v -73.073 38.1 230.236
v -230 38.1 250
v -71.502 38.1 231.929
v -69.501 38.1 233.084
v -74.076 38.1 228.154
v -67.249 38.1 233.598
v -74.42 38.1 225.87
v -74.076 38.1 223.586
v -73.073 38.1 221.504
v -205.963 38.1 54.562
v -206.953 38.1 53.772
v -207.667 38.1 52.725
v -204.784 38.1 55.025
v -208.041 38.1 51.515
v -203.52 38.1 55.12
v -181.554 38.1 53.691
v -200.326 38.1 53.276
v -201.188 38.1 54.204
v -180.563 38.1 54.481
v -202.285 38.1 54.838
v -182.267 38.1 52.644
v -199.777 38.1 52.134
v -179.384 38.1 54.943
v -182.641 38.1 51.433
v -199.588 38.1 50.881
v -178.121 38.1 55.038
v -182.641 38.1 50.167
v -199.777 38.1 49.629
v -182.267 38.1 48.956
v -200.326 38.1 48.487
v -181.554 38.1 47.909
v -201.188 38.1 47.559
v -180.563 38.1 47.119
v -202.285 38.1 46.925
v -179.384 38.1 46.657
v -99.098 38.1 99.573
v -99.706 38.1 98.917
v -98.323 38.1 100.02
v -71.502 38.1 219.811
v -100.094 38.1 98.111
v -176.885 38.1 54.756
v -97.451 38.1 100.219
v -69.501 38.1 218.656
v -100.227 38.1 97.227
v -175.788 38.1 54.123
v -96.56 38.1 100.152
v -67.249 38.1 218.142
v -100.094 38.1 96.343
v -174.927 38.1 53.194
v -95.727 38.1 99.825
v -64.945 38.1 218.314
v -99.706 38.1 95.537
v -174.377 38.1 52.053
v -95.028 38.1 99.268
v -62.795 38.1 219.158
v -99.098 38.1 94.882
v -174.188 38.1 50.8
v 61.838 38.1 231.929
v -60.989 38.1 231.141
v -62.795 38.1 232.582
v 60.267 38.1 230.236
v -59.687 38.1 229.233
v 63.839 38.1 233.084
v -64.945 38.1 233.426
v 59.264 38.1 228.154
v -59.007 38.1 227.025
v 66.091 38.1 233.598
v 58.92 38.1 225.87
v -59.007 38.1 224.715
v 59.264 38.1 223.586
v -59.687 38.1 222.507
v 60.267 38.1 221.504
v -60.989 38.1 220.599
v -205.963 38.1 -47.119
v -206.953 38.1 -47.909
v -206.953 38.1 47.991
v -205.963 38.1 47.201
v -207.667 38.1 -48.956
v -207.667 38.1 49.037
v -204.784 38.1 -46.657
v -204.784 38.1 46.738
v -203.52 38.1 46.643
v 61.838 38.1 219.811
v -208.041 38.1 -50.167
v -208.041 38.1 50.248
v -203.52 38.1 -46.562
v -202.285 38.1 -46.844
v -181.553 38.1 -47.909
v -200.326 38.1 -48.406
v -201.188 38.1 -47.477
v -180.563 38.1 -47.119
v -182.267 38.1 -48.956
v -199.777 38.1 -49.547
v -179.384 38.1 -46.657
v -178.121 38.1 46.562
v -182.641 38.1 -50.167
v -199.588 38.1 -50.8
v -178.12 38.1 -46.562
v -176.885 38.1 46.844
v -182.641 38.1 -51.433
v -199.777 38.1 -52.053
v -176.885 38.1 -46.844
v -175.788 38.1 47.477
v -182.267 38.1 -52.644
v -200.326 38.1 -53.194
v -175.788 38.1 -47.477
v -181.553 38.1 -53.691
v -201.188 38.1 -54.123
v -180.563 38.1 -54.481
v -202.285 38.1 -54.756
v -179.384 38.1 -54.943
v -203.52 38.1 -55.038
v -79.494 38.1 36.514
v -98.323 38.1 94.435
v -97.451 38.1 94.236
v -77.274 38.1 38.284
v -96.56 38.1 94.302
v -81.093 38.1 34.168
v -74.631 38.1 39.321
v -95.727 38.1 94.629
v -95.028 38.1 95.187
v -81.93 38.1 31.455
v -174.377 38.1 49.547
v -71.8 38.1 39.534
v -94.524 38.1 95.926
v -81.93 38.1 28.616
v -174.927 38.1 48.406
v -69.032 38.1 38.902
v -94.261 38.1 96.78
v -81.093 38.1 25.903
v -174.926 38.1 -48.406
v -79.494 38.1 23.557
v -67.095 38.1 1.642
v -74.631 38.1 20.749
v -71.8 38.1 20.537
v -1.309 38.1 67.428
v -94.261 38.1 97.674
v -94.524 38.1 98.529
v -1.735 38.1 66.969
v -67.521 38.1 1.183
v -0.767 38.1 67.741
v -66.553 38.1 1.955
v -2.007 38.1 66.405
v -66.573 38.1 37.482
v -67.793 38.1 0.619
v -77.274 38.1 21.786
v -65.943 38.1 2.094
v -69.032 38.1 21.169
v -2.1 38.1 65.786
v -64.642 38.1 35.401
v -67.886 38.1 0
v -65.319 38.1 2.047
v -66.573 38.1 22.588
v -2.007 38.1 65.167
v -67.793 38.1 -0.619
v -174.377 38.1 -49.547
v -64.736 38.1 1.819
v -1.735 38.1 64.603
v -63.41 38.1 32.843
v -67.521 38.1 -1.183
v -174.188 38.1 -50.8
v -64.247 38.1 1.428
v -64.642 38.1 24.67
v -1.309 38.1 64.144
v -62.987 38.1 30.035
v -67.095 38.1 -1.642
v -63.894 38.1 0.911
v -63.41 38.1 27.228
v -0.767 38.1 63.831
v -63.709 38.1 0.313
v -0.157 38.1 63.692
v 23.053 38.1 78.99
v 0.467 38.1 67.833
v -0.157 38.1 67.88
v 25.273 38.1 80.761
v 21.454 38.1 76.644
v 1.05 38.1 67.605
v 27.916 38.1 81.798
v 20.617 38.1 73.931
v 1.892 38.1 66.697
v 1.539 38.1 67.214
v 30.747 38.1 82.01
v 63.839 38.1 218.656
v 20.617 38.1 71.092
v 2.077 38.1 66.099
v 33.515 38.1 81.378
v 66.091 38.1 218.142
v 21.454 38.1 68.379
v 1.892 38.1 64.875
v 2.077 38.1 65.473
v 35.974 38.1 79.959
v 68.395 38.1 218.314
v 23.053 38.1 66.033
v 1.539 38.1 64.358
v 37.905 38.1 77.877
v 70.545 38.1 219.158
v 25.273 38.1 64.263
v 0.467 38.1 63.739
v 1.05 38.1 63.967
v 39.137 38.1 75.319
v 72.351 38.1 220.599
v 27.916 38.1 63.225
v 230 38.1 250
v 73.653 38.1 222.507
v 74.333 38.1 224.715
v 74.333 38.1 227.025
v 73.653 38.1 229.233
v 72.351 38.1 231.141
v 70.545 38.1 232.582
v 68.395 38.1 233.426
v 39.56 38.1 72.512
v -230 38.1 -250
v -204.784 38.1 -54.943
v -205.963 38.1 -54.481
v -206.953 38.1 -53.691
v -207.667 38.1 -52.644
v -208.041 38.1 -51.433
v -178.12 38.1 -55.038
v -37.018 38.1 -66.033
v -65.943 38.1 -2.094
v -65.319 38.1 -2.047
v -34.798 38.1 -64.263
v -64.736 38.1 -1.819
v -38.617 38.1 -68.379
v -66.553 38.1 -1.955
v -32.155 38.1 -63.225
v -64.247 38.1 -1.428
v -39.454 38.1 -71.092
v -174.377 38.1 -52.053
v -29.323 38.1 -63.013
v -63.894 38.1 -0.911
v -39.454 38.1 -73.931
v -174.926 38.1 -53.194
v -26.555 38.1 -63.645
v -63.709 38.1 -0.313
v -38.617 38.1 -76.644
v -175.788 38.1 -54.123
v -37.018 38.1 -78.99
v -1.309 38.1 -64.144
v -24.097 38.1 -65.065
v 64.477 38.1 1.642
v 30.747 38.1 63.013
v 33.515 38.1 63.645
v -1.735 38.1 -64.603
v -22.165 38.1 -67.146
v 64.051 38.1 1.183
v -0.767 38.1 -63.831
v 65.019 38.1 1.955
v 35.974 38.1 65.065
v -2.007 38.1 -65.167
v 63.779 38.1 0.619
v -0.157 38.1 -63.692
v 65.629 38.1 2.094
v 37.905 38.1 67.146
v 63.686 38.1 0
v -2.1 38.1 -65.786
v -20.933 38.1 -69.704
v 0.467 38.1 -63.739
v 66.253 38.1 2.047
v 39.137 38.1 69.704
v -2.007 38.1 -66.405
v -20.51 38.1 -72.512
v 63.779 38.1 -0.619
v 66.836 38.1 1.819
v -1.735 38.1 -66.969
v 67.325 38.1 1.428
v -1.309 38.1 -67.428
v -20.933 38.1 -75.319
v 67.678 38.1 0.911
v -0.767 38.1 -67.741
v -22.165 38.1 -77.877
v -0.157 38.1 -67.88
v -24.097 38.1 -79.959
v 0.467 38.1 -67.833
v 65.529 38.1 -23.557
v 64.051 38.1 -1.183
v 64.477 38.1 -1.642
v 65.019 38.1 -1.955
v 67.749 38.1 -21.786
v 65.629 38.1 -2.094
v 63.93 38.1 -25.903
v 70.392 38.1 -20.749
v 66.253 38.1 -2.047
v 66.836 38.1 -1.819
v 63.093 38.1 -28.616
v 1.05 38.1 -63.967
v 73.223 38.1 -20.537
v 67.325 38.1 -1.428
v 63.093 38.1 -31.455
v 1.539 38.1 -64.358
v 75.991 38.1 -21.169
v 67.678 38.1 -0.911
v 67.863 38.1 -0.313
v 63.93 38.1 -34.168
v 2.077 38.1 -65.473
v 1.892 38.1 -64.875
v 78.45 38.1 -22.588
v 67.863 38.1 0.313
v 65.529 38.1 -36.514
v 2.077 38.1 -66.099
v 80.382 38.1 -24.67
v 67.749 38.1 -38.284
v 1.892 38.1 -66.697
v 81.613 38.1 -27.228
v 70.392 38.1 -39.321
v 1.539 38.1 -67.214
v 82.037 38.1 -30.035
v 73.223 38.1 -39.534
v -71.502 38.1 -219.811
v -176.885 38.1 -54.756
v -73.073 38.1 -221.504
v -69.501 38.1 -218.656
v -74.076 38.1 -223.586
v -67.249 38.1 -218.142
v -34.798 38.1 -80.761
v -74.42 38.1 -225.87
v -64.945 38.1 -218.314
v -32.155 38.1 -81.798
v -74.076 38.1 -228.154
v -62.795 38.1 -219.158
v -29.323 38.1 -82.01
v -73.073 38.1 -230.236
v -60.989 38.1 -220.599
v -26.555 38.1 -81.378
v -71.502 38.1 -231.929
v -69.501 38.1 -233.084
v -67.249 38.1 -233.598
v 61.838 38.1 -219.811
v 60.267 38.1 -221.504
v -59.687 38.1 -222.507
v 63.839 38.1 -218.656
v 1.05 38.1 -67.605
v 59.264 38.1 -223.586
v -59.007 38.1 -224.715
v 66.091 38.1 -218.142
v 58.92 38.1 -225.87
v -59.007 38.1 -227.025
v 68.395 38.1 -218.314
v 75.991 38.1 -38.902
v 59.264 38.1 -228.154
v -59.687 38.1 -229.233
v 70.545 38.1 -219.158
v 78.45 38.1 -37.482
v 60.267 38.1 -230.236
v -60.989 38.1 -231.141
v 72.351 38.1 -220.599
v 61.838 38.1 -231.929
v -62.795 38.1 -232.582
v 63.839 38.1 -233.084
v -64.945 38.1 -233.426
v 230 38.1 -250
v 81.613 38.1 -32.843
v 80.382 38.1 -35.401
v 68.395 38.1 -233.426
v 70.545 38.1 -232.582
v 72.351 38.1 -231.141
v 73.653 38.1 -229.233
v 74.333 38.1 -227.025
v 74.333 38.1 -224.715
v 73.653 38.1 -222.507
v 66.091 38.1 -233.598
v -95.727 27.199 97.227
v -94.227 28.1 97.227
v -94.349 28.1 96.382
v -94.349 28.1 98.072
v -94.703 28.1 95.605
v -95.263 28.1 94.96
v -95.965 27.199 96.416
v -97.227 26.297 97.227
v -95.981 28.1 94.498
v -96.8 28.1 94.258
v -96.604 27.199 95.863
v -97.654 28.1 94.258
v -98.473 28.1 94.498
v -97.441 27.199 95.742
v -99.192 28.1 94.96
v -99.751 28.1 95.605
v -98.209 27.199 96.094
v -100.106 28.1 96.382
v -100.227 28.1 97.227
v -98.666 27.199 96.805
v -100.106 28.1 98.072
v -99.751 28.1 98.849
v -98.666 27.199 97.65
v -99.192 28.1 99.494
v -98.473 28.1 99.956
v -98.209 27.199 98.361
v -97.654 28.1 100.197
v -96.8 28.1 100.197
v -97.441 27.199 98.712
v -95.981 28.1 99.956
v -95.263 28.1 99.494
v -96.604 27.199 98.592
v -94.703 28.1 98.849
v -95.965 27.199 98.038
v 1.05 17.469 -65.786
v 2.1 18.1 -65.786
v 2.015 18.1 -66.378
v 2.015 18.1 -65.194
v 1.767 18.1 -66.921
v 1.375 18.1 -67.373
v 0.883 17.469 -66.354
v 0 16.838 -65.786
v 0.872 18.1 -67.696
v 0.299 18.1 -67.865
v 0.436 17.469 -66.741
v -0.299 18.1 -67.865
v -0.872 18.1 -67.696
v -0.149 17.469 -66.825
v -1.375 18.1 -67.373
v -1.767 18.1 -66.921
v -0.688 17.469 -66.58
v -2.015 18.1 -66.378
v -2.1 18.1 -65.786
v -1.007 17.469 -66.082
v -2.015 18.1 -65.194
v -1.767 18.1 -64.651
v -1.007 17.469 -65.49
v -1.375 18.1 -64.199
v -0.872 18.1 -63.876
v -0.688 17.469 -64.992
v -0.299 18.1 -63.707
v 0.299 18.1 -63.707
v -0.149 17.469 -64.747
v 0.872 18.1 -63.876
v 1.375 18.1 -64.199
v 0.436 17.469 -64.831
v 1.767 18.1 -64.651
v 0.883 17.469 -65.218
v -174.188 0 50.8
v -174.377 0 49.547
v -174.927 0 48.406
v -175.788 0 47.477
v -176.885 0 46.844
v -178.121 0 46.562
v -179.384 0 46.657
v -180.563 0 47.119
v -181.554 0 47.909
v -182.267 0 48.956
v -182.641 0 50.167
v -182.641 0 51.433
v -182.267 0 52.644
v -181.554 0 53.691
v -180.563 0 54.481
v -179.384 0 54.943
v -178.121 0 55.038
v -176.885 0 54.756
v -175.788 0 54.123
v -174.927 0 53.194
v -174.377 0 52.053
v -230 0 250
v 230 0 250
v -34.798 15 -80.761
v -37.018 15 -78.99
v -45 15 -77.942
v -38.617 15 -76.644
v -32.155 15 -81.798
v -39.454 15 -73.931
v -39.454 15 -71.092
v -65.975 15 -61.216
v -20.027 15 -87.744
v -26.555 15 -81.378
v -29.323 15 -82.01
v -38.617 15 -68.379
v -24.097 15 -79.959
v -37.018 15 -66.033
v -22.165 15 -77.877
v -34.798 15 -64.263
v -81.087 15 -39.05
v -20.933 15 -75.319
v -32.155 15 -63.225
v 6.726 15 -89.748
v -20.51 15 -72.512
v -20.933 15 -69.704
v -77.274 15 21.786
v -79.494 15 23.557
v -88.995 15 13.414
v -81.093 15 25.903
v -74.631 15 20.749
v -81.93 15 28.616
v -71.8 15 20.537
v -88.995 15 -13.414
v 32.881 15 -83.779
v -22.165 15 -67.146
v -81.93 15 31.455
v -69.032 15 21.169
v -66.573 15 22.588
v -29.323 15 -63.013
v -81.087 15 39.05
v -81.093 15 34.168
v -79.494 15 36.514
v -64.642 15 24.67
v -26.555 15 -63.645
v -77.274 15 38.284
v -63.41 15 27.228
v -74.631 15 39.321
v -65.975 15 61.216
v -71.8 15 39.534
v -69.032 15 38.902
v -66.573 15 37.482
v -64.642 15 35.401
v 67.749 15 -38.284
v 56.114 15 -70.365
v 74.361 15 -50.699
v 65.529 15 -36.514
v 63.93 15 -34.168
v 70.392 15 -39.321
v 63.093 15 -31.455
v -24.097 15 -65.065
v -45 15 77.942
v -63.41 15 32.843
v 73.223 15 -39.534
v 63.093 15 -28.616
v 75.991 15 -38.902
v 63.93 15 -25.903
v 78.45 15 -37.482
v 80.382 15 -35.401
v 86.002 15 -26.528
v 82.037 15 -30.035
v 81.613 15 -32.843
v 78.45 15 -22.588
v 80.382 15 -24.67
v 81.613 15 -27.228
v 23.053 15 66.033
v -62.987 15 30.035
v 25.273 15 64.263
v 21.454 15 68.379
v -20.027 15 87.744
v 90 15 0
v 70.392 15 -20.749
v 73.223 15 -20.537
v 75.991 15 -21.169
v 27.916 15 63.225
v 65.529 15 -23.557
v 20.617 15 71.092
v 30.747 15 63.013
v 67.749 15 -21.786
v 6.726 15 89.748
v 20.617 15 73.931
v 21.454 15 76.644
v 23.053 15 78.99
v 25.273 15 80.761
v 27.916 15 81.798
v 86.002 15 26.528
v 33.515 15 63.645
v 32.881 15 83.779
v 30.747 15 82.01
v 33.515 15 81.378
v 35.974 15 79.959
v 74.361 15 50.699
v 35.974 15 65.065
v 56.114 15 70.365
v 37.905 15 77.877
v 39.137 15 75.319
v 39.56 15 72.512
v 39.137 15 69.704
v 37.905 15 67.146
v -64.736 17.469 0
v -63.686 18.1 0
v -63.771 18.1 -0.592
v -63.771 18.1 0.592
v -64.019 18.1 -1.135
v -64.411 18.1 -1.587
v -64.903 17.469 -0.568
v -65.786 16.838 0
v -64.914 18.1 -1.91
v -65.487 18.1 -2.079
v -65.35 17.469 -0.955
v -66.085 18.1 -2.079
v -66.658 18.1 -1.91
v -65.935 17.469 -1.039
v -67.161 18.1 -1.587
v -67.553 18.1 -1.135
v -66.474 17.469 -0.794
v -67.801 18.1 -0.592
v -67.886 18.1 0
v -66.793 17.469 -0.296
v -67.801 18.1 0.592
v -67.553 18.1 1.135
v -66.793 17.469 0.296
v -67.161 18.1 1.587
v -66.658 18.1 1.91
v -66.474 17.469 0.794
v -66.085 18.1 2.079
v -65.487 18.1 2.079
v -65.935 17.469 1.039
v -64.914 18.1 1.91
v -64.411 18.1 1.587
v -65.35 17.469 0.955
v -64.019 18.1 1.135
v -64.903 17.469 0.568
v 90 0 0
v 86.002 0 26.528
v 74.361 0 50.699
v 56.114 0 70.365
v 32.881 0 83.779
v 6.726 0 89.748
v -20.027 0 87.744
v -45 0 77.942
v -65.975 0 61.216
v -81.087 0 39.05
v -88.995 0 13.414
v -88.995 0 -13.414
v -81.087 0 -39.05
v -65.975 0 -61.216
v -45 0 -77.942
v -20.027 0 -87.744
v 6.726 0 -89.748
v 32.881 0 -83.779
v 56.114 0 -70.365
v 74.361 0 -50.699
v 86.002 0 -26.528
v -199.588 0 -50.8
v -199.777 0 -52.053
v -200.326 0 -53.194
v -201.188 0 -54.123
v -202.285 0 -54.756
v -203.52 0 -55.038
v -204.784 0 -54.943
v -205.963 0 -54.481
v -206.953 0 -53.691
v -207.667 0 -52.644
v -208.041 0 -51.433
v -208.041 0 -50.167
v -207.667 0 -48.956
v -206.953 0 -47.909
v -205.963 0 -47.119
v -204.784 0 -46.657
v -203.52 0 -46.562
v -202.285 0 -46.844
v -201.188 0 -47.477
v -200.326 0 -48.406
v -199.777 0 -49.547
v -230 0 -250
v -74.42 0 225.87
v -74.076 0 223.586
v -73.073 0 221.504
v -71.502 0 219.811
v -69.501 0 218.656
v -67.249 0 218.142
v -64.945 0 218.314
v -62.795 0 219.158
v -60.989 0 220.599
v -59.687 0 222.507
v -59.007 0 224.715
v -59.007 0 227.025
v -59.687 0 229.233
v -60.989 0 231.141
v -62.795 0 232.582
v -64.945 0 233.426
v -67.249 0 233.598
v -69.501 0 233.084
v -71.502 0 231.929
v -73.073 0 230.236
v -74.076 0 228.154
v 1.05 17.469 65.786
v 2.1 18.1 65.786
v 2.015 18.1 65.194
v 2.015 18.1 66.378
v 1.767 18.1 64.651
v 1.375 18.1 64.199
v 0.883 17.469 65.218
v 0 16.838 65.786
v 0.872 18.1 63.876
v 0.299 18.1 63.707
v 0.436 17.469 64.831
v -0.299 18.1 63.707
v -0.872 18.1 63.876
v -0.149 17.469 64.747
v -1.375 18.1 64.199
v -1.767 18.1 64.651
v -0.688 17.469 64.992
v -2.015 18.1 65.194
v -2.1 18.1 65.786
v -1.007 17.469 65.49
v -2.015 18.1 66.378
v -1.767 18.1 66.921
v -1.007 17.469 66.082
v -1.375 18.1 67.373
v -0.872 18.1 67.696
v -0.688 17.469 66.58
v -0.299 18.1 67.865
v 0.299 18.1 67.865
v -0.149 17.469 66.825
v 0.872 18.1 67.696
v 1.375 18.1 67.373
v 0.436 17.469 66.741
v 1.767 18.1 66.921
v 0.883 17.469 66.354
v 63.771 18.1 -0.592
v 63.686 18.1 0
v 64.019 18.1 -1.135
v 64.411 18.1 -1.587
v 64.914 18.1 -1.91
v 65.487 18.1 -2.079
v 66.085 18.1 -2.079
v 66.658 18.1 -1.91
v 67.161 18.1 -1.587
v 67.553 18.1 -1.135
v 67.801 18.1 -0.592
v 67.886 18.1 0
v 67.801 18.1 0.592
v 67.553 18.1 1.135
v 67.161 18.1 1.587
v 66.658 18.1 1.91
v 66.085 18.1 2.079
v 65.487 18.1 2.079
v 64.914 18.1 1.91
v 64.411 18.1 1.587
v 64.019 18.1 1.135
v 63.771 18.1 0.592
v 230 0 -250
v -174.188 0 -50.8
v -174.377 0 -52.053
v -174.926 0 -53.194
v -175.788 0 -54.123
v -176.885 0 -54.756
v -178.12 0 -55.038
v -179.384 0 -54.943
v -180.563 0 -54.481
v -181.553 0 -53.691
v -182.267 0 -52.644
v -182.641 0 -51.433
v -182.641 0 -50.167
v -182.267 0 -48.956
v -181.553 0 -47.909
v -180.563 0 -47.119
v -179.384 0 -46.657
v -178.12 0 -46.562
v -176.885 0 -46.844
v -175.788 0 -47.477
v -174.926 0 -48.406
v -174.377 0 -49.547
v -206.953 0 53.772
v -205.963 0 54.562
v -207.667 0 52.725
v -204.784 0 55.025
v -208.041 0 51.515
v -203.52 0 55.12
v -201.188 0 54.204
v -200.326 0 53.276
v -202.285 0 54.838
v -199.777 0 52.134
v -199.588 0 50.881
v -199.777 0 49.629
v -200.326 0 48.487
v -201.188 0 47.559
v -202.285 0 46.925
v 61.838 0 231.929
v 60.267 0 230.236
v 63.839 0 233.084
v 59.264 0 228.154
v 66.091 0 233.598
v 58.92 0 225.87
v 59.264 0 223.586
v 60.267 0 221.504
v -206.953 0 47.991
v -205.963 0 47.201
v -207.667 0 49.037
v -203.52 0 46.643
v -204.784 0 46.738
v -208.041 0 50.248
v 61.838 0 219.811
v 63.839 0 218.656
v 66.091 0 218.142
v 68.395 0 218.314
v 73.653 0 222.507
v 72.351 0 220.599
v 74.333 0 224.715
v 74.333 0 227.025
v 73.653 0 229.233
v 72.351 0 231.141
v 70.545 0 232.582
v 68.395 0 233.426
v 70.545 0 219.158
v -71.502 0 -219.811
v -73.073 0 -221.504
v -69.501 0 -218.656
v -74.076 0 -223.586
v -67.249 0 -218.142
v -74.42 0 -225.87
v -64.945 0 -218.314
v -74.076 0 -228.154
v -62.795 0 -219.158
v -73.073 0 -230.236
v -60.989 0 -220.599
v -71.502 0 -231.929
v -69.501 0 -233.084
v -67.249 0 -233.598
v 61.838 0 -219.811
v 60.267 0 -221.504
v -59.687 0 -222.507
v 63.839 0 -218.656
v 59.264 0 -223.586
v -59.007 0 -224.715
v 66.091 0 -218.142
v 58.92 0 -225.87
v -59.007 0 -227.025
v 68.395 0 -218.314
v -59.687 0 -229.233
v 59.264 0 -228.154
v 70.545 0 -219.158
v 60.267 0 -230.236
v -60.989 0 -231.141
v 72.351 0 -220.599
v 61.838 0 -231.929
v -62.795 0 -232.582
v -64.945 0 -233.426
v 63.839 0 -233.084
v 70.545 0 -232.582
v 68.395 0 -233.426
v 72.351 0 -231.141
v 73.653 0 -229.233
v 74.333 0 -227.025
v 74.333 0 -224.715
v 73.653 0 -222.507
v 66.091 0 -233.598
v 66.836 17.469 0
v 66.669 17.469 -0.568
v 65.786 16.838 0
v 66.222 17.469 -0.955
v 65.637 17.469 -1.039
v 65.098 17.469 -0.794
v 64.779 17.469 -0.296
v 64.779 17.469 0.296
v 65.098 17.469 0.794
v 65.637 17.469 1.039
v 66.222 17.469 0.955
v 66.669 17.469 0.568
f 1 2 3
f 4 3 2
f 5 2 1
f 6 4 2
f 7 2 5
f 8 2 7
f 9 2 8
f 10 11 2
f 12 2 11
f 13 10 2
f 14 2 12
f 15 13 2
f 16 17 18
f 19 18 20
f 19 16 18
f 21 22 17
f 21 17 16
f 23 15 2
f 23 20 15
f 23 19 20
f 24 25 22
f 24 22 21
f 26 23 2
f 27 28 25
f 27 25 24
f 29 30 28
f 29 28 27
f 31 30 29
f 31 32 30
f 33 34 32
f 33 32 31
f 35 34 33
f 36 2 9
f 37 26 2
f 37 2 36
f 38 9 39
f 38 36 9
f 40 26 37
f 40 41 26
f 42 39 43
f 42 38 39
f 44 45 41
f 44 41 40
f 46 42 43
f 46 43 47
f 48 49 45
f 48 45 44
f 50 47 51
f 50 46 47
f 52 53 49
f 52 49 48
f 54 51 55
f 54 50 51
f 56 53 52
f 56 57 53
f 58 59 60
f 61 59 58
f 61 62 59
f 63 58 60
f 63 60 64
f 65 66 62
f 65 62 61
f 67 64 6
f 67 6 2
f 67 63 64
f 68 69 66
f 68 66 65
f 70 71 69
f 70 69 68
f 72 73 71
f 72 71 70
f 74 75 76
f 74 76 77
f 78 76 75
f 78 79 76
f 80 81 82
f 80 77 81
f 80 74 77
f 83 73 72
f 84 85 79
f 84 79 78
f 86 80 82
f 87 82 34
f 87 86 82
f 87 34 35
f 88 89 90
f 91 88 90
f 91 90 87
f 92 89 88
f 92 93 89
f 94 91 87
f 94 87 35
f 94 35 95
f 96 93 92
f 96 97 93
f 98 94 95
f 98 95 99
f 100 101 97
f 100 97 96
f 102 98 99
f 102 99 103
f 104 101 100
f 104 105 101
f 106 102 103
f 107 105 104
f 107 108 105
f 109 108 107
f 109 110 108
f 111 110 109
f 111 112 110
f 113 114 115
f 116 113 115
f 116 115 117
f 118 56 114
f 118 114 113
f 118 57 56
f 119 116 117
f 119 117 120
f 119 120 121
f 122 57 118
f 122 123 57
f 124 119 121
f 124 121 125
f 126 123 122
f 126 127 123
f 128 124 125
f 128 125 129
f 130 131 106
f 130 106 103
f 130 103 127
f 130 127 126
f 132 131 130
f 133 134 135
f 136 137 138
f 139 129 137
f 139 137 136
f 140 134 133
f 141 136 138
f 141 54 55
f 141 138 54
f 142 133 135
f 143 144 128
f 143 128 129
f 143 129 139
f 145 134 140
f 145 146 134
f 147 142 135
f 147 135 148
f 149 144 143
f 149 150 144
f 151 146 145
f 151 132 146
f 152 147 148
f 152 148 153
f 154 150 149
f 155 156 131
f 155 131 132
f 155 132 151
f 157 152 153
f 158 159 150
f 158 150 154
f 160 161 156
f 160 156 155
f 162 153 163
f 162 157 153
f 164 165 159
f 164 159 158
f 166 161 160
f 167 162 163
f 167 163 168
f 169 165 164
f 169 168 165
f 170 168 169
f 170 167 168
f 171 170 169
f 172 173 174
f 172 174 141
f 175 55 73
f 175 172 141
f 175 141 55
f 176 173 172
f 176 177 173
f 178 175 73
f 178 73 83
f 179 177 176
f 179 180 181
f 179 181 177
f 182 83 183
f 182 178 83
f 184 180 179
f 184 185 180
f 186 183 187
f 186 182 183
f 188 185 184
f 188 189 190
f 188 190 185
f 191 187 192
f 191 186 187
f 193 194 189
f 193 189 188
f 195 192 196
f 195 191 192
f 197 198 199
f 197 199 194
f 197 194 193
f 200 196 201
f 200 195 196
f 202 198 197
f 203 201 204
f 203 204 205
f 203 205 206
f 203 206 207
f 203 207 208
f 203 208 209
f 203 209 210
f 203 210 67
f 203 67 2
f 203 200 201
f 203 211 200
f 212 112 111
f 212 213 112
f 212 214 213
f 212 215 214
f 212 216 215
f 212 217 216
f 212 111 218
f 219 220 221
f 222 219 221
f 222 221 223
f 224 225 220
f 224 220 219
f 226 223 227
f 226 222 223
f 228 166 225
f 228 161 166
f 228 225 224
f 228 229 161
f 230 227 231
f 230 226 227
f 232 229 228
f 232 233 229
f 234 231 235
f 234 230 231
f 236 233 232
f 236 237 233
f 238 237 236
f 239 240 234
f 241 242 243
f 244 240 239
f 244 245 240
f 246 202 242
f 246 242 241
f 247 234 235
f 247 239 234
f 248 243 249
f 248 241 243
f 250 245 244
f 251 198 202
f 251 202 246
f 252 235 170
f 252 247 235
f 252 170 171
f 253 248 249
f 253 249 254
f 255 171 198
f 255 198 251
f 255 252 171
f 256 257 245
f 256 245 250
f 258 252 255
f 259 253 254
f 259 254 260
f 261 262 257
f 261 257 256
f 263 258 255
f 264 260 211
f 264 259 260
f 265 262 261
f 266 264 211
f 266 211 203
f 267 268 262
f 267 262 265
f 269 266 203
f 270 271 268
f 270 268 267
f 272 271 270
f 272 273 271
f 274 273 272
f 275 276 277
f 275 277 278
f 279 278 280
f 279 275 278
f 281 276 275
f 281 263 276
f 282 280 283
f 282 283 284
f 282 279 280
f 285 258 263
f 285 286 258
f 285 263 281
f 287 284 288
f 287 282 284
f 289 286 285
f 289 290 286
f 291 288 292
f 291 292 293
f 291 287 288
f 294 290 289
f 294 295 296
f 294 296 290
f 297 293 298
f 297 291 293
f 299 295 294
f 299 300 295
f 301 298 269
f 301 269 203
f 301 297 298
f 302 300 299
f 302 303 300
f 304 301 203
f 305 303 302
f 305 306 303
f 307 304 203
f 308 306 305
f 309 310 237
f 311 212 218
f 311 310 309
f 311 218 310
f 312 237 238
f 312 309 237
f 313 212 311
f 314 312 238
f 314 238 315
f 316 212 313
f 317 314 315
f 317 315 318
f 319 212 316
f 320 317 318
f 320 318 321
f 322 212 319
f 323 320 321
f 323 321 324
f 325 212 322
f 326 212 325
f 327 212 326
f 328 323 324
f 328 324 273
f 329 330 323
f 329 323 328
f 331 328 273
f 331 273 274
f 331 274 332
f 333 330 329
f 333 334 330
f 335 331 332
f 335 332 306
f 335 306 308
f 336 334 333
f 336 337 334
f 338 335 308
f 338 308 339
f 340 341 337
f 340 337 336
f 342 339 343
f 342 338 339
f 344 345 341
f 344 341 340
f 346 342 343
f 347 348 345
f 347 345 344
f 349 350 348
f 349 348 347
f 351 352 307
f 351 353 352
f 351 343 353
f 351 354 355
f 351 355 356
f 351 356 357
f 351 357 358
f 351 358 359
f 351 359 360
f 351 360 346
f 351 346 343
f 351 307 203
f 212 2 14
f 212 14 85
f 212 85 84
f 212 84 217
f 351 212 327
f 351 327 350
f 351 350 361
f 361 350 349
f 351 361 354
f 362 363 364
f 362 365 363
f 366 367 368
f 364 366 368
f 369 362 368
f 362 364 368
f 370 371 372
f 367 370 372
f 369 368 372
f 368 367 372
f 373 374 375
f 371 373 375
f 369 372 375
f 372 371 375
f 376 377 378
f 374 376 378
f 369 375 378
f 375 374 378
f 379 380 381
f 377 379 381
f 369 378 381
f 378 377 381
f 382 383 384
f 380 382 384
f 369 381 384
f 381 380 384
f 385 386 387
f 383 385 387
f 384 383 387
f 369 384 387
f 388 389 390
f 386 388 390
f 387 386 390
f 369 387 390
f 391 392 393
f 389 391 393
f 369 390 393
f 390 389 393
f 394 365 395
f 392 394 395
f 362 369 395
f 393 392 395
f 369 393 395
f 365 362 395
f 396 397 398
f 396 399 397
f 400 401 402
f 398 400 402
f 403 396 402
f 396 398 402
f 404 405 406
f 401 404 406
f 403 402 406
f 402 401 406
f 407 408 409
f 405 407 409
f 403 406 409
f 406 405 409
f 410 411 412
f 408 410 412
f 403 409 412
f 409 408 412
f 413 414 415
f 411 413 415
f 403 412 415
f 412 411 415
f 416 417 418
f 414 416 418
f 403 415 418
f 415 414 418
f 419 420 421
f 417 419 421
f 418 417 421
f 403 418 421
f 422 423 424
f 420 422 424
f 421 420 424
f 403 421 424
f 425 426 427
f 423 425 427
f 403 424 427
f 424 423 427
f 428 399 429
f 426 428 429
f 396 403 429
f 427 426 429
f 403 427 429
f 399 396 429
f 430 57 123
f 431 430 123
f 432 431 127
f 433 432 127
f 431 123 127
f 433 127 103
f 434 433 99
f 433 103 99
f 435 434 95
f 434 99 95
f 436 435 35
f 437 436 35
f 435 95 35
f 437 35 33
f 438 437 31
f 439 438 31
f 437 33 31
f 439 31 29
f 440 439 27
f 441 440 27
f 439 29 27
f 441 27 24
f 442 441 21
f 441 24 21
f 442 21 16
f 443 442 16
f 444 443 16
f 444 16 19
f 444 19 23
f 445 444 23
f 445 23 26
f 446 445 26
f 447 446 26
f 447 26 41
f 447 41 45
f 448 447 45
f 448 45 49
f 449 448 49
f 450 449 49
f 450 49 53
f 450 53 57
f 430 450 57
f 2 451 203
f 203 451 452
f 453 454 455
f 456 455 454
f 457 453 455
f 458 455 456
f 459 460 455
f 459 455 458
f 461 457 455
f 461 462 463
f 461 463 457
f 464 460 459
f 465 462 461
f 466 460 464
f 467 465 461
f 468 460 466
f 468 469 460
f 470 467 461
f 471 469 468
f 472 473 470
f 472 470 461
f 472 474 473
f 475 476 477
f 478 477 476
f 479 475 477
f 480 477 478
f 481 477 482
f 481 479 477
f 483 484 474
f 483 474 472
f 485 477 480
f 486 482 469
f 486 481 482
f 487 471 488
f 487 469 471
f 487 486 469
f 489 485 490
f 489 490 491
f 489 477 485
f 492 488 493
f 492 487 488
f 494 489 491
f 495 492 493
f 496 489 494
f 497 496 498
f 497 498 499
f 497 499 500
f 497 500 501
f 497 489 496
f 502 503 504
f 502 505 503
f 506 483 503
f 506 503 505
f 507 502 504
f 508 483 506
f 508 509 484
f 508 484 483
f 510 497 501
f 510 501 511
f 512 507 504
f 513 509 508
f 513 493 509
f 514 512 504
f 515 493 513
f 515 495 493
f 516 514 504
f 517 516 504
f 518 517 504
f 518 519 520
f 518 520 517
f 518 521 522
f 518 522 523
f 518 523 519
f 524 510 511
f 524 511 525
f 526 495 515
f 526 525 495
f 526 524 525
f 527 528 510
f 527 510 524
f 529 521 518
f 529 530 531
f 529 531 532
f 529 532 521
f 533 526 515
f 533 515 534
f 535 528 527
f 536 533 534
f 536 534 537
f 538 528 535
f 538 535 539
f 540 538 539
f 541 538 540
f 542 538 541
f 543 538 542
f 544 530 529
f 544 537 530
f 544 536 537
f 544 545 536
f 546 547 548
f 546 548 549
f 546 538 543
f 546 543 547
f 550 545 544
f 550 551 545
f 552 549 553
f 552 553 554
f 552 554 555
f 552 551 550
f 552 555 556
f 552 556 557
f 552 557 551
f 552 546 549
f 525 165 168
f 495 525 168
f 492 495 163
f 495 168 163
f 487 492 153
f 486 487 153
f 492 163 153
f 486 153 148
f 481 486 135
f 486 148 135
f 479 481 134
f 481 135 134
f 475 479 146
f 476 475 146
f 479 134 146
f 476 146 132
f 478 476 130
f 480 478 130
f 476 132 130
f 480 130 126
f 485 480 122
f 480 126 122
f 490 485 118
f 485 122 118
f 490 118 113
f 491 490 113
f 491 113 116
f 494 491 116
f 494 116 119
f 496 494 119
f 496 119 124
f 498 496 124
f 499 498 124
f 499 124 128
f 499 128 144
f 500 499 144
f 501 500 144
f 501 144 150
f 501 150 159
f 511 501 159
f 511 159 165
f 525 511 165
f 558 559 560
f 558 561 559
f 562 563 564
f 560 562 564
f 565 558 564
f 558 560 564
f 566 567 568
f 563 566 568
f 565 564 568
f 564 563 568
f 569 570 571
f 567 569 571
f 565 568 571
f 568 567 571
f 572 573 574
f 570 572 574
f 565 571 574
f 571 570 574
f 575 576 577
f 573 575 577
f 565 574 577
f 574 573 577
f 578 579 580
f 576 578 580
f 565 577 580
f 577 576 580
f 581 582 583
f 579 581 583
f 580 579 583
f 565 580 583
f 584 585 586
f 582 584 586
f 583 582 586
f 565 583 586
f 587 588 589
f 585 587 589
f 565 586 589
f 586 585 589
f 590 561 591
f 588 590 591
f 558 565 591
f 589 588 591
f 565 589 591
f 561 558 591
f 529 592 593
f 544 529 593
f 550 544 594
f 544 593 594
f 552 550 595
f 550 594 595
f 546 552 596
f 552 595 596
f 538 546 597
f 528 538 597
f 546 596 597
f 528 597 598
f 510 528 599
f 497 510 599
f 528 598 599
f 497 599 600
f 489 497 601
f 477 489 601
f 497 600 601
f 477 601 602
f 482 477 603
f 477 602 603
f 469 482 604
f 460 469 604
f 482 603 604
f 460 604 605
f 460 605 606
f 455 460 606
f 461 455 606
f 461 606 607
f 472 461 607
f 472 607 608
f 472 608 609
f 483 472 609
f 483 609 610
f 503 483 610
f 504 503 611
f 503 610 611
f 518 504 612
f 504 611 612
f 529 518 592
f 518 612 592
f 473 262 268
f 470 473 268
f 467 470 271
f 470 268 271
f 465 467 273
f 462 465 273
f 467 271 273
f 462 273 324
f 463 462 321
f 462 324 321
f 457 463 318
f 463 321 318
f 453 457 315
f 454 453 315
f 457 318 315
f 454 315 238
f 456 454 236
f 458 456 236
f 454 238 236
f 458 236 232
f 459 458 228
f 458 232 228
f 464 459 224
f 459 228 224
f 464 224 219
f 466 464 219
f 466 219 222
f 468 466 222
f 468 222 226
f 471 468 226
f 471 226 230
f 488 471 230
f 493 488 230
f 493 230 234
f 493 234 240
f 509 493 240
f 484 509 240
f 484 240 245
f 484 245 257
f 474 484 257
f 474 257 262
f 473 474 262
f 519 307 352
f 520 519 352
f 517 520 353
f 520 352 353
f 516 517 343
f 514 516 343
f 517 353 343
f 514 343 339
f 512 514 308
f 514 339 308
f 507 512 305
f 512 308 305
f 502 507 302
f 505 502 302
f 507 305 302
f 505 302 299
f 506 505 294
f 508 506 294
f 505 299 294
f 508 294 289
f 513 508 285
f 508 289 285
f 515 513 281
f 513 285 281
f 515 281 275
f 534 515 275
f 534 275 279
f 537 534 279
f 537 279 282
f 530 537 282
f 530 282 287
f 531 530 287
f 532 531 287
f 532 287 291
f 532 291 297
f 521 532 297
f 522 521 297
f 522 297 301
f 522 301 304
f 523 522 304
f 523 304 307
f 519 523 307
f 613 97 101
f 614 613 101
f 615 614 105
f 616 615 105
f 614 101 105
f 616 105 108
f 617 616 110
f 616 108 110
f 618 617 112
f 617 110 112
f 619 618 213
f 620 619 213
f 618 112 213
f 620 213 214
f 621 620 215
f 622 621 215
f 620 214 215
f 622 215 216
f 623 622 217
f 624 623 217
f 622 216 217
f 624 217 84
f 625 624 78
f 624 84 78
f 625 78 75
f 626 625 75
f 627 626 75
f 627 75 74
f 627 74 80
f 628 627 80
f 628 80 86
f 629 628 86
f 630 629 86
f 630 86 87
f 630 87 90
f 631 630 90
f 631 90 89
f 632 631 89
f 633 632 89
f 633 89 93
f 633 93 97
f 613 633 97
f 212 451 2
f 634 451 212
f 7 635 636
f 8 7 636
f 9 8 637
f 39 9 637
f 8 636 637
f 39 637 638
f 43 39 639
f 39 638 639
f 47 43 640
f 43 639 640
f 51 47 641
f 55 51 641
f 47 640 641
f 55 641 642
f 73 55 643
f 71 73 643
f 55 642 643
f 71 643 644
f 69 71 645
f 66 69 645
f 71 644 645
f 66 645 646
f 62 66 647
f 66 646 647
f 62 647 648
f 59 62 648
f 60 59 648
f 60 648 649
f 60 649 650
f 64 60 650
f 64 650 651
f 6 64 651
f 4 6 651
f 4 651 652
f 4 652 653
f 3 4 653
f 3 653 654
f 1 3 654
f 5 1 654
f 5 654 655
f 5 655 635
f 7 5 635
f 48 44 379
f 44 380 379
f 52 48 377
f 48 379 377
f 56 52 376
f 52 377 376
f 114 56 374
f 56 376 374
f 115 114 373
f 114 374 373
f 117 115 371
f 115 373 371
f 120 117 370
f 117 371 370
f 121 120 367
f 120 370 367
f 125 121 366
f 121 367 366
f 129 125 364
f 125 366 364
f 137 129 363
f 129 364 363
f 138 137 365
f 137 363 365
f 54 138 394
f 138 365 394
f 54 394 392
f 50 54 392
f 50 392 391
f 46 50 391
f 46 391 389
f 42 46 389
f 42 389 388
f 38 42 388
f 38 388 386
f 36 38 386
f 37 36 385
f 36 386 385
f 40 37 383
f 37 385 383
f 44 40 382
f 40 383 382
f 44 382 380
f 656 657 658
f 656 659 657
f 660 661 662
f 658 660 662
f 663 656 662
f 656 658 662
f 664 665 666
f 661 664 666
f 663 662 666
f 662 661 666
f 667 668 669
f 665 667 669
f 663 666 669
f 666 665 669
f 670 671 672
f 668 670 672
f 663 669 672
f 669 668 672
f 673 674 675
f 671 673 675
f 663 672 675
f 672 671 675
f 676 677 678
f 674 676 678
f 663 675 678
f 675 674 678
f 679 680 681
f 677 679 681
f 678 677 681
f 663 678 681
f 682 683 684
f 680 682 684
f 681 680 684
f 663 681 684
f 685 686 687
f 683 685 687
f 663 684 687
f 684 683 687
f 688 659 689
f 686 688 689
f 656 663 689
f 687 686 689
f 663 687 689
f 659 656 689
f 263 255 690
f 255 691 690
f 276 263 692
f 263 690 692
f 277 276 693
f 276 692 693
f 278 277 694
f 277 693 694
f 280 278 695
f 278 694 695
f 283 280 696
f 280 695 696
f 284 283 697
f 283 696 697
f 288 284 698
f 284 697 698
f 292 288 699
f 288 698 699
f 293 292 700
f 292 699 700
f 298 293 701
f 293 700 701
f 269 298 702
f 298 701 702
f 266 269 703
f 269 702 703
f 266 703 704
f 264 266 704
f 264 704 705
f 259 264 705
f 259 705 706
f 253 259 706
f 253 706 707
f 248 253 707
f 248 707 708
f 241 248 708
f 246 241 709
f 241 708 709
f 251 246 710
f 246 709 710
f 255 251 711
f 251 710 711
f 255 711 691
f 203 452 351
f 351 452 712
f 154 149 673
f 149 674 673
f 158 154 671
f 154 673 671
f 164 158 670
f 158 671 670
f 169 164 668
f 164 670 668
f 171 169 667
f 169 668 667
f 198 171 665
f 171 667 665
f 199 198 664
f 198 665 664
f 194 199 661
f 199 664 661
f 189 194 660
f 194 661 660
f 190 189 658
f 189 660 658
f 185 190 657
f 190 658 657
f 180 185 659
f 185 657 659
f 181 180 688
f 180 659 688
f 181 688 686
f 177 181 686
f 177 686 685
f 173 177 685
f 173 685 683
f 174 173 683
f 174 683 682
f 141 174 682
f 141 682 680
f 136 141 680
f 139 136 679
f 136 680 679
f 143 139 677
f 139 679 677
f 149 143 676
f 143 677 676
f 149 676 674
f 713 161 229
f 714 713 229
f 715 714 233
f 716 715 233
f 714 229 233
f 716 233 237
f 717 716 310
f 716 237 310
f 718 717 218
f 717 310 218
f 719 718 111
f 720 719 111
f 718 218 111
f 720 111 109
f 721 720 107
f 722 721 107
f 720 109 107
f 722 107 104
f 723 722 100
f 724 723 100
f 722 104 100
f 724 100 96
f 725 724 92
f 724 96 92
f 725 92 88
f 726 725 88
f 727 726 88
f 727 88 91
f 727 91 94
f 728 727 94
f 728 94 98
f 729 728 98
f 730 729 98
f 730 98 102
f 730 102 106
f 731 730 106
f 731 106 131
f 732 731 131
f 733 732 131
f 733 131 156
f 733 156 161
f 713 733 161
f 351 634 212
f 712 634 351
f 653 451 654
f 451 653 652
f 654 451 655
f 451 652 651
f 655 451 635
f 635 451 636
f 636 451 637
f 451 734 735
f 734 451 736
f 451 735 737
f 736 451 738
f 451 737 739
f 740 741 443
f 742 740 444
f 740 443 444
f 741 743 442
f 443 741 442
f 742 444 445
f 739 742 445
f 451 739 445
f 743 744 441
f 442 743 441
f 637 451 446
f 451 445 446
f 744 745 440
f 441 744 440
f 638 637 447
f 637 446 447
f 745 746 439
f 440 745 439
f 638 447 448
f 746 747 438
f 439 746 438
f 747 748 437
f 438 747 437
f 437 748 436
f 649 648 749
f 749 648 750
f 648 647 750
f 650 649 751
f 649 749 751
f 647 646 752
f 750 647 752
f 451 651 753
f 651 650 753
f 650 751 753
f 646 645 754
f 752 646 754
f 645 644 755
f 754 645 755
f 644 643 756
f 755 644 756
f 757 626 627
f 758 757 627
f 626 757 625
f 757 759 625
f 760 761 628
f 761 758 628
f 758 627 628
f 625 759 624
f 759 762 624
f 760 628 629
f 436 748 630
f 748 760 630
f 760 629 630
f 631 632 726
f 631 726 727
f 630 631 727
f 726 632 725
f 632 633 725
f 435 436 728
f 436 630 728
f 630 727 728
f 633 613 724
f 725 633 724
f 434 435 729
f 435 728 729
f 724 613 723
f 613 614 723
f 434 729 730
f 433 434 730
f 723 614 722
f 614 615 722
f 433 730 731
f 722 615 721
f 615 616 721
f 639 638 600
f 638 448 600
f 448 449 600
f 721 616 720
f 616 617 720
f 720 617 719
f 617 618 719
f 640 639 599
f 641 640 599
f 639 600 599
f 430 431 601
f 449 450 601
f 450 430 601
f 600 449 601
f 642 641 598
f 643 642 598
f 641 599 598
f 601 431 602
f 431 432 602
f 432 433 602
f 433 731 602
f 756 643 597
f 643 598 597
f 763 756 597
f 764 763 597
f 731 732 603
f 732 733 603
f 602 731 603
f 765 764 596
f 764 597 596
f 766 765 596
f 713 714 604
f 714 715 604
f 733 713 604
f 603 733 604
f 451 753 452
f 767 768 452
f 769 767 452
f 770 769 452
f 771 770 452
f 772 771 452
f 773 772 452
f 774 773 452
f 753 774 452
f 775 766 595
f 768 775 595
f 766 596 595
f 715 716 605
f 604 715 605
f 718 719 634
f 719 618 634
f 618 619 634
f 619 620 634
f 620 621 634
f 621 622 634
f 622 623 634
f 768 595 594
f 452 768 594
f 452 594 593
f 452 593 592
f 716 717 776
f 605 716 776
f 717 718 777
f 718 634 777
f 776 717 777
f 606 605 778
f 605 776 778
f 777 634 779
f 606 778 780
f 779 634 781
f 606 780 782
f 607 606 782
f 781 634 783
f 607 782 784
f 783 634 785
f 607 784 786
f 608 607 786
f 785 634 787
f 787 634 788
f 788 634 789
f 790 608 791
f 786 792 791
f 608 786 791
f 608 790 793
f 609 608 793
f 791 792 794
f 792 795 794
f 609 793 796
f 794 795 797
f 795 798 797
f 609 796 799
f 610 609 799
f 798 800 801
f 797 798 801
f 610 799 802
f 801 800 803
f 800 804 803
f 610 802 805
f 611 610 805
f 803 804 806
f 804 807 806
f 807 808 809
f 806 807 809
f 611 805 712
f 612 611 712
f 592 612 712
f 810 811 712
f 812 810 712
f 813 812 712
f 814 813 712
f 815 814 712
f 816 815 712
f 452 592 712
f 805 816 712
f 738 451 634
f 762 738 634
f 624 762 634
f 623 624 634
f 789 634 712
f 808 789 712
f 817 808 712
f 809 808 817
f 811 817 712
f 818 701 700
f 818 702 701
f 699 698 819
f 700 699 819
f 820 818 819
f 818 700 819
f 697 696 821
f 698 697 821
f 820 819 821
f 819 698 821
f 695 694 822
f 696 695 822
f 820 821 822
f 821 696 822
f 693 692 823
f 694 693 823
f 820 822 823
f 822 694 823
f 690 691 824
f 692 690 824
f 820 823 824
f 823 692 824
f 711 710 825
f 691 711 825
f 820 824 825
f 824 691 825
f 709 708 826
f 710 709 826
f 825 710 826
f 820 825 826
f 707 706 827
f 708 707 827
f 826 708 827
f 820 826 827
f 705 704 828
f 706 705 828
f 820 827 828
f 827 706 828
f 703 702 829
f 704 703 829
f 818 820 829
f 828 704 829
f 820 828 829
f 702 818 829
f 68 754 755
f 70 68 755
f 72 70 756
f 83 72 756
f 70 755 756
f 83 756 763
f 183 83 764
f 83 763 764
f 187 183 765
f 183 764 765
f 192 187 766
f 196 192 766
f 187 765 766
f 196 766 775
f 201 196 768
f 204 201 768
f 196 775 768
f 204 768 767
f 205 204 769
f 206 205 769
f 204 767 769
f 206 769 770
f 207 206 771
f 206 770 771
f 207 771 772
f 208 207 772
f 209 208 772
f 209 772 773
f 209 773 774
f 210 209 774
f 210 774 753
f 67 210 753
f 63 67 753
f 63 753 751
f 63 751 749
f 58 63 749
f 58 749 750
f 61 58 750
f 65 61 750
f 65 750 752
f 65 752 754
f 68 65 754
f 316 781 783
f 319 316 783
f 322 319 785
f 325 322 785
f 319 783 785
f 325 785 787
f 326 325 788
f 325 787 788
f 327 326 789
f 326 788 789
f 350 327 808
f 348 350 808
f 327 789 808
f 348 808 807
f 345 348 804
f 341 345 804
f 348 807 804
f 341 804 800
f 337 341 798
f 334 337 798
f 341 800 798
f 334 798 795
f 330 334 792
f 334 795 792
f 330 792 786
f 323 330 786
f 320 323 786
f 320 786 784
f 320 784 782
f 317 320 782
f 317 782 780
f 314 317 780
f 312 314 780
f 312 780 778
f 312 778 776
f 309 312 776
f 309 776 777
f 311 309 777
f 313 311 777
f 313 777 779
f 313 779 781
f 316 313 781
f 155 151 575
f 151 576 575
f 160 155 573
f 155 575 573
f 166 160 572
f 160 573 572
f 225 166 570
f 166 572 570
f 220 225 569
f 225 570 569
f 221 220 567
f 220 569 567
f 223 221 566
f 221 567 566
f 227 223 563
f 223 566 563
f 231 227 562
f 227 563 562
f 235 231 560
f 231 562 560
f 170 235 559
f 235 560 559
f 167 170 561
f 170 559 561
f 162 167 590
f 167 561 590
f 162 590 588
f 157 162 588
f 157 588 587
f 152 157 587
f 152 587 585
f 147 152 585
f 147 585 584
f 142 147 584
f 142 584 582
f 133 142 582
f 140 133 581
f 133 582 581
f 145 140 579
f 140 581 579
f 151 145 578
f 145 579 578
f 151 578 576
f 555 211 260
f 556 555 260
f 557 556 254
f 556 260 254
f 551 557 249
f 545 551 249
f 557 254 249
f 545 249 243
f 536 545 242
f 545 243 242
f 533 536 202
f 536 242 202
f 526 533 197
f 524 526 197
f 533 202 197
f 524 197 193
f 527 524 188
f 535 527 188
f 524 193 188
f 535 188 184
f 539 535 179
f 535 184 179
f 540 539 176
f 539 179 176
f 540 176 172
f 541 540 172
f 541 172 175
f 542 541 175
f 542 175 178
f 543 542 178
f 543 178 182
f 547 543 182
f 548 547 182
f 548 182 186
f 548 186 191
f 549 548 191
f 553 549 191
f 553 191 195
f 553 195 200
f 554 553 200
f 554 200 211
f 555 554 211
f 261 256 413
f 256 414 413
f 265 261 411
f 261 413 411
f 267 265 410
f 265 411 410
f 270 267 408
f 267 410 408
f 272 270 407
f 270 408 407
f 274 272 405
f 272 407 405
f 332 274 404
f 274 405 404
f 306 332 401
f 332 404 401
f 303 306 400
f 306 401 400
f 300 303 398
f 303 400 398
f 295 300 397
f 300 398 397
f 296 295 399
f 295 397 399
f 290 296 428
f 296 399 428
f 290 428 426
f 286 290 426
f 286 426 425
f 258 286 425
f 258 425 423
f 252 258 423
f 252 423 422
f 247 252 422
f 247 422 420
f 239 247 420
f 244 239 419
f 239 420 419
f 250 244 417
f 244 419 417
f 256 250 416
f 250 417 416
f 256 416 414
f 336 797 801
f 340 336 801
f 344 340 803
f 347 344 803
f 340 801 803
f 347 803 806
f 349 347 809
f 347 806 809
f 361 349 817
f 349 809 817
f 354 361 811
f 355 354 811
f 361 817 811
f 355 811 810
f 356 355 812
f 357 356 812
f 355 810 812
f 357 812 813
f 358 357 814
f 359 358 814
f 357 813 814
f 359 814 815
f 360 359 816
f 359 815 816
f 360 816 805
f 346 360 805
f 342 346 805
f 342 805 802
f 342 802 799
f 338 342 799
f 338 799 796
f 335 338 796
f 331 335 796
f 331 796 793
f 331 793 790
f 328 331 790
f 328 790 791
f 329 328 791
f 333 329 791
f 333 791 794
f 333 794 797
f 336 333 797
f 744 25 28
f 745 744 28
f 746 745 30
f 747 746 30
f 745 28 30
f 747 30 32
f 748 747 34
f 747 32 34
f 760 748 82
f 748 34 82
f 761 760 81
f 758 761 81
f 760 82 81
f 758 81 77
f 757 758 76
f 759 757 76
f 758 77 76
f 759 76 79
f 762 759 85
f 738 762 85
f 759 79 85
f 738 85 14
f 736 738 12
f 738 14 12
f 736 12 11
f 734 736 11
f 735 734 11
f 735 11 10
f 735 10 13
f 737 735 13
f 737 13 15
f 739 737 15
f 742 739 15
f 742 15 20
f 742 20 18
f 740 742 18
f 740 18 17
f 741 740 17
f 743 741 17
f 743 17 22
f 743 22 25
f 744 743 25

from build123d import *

# Parameters (mm, degrees)
SKETCH1_W                       = 460
SKETCH1_H                       = 500
BOSS_EXTRUDE1_DEPTH             = 38.1
TAP_DRILL_FOR_M5X0_8_TAP1_D     = 4.2
TAP_DRILL_FOR_M5X0_8_TAP1_DEPTH = 20
TAP_DRILL_FOR_M5X0_8_TAP1_TIP   = 1.2618073
F_3_4_0_7500_DOWEL_HOLE1_D      = 19.05
SKETCH13_R                      = 90
CUT_EXTRUDE4_DEPTH              = 15
M14_CLEARANCE_HOLE1_D           = 15.5
TAP_DRILL_FOR_M10X1_5_TAP1_D    = 8.5
F_6_0MM_DOWEL_HOLE1_D           = 6
F_6_0MM_DOWEL_HOLE1_DEPTH       = 10
F_6_0MM_DOWEL_HOLE1_TIP         = 1.802581857


with BuildPart() as part:
    # Sketch1 → Boss-Extrude1 (new body)
    with BuildSketch(Plane(origin=(0, 0, 0), x_dir=(1, 0, 0), z_dir=(0, 1, 0))):
        Rectangle(SKETCH1_W, SKETCH1_H)
    extrude(amount=BOSS_EXTRUDE1_DEPTH)

    # Tap Drill for M5x0.8 Tap1
    with Locations(Plane(origin=(0, 38.1, 0), x_dir=(1, 0, 0), z_dir=(0, 1, 0))):
        with Locations((0, 65.786), (65.786, 0), (0, -65.786), (-65.786, 0)):
            Hole(TAP_DRILL_FOR_M5X0_8_TAP1_D / 2, depth=TAP_DRILL_FOR_M5X0_8_TAP1_DEPTH)
            with Locations((0, 0, -(TAP_DRILL_FOR_M5X0_8_TAP1_DEPTH + TAP_DRILL_FOR_M5X0_8_TAP1_TIP / 2))):  # 118° drill point
                Cone(0, TAP_DRILL_FOR_M5X0_8_TAP1_D / 2, TAP_DRILL_FOR_M5X0_8_TAP1_TIP, mode=Mode.SUBTRACT)

    # 3/4 (0.7500) Dowel Hole1 (through all)
    with Locations(Plane(origin=(0, 0, 0), x_dir=(-1, 0, 0), z_dir=(0, -1, 0))):
        with Locations((72.511608989, -30.035291873), (-30.035291873, -72.511608989), (30.035291873, 72.511608989), (-72.511608989, 30.035291873)):
            Hole(F_3_4_0_7500_DOWEL_HOLE1_D / 2)

    # Sketch13 → Cut-Extrude4 (cut)
    with BuildSketch(Plane.XZ):
        Circle(SKETCH13_R)
    extrude(amount=-CUT_EXTRUDE4_DEPTH, mode=Mode.SUBTRACT)

    # M14 Clearance Hole1 (through all)
    with Locations(Plane(origin=(0, 38.1, 0), x_dir=(1, 0, 0), z_dir=(0, 1, 0))):
        with Locations((66.67, -225.87), (-66.67, -225.87), (-66.67, 225.87), (66.67, 225.87)):
            Hole(M14_CLEARANCE_HOLE1_D / 2)

    # Tap Drill for M10x1.5 Tap1 (through all)
    with Locations(Plane(origin=(0, 0, 0), x_dir=(-1, 0, 0), z_dir=(0, -1, 0))):
        with Locations((178.438, 50.8), (203.838, 50.8), (178.438130466, -50.8), (203.838, -50.881410466)):
            Hole(TAP_DRILL_FOR_M10X1_5_TAP1_D / 2)

    # Ø6.0mm Dowel Hole1
    with Locations(Plane(origin=(0, 38.1, 0), x_dir=(1, 0, 0), z_dir=(0, 1, 0))):
        with Locations((-97.227182413, -97.227182413)):
            Hole(F_6_0MM_DOWEL_HOLE1_D / 2, depth=F_6_0MM_DOWEL_HOLE1_DEPTH)
            with Locations((0, 0, -(F_6_0MM_DOWEL_HOLE1_DEPTH + F_6_0MM_DOWEL_HOLE1_TIP / 2))):  # 118° drill point
                Cone(0, F_6_0MM_DOWEL_HOLE1_D / 2, F_6_0MM_DOWEL_HOLE1_TIP, mode=Mode.SUBTRACT)


solid = part.part
